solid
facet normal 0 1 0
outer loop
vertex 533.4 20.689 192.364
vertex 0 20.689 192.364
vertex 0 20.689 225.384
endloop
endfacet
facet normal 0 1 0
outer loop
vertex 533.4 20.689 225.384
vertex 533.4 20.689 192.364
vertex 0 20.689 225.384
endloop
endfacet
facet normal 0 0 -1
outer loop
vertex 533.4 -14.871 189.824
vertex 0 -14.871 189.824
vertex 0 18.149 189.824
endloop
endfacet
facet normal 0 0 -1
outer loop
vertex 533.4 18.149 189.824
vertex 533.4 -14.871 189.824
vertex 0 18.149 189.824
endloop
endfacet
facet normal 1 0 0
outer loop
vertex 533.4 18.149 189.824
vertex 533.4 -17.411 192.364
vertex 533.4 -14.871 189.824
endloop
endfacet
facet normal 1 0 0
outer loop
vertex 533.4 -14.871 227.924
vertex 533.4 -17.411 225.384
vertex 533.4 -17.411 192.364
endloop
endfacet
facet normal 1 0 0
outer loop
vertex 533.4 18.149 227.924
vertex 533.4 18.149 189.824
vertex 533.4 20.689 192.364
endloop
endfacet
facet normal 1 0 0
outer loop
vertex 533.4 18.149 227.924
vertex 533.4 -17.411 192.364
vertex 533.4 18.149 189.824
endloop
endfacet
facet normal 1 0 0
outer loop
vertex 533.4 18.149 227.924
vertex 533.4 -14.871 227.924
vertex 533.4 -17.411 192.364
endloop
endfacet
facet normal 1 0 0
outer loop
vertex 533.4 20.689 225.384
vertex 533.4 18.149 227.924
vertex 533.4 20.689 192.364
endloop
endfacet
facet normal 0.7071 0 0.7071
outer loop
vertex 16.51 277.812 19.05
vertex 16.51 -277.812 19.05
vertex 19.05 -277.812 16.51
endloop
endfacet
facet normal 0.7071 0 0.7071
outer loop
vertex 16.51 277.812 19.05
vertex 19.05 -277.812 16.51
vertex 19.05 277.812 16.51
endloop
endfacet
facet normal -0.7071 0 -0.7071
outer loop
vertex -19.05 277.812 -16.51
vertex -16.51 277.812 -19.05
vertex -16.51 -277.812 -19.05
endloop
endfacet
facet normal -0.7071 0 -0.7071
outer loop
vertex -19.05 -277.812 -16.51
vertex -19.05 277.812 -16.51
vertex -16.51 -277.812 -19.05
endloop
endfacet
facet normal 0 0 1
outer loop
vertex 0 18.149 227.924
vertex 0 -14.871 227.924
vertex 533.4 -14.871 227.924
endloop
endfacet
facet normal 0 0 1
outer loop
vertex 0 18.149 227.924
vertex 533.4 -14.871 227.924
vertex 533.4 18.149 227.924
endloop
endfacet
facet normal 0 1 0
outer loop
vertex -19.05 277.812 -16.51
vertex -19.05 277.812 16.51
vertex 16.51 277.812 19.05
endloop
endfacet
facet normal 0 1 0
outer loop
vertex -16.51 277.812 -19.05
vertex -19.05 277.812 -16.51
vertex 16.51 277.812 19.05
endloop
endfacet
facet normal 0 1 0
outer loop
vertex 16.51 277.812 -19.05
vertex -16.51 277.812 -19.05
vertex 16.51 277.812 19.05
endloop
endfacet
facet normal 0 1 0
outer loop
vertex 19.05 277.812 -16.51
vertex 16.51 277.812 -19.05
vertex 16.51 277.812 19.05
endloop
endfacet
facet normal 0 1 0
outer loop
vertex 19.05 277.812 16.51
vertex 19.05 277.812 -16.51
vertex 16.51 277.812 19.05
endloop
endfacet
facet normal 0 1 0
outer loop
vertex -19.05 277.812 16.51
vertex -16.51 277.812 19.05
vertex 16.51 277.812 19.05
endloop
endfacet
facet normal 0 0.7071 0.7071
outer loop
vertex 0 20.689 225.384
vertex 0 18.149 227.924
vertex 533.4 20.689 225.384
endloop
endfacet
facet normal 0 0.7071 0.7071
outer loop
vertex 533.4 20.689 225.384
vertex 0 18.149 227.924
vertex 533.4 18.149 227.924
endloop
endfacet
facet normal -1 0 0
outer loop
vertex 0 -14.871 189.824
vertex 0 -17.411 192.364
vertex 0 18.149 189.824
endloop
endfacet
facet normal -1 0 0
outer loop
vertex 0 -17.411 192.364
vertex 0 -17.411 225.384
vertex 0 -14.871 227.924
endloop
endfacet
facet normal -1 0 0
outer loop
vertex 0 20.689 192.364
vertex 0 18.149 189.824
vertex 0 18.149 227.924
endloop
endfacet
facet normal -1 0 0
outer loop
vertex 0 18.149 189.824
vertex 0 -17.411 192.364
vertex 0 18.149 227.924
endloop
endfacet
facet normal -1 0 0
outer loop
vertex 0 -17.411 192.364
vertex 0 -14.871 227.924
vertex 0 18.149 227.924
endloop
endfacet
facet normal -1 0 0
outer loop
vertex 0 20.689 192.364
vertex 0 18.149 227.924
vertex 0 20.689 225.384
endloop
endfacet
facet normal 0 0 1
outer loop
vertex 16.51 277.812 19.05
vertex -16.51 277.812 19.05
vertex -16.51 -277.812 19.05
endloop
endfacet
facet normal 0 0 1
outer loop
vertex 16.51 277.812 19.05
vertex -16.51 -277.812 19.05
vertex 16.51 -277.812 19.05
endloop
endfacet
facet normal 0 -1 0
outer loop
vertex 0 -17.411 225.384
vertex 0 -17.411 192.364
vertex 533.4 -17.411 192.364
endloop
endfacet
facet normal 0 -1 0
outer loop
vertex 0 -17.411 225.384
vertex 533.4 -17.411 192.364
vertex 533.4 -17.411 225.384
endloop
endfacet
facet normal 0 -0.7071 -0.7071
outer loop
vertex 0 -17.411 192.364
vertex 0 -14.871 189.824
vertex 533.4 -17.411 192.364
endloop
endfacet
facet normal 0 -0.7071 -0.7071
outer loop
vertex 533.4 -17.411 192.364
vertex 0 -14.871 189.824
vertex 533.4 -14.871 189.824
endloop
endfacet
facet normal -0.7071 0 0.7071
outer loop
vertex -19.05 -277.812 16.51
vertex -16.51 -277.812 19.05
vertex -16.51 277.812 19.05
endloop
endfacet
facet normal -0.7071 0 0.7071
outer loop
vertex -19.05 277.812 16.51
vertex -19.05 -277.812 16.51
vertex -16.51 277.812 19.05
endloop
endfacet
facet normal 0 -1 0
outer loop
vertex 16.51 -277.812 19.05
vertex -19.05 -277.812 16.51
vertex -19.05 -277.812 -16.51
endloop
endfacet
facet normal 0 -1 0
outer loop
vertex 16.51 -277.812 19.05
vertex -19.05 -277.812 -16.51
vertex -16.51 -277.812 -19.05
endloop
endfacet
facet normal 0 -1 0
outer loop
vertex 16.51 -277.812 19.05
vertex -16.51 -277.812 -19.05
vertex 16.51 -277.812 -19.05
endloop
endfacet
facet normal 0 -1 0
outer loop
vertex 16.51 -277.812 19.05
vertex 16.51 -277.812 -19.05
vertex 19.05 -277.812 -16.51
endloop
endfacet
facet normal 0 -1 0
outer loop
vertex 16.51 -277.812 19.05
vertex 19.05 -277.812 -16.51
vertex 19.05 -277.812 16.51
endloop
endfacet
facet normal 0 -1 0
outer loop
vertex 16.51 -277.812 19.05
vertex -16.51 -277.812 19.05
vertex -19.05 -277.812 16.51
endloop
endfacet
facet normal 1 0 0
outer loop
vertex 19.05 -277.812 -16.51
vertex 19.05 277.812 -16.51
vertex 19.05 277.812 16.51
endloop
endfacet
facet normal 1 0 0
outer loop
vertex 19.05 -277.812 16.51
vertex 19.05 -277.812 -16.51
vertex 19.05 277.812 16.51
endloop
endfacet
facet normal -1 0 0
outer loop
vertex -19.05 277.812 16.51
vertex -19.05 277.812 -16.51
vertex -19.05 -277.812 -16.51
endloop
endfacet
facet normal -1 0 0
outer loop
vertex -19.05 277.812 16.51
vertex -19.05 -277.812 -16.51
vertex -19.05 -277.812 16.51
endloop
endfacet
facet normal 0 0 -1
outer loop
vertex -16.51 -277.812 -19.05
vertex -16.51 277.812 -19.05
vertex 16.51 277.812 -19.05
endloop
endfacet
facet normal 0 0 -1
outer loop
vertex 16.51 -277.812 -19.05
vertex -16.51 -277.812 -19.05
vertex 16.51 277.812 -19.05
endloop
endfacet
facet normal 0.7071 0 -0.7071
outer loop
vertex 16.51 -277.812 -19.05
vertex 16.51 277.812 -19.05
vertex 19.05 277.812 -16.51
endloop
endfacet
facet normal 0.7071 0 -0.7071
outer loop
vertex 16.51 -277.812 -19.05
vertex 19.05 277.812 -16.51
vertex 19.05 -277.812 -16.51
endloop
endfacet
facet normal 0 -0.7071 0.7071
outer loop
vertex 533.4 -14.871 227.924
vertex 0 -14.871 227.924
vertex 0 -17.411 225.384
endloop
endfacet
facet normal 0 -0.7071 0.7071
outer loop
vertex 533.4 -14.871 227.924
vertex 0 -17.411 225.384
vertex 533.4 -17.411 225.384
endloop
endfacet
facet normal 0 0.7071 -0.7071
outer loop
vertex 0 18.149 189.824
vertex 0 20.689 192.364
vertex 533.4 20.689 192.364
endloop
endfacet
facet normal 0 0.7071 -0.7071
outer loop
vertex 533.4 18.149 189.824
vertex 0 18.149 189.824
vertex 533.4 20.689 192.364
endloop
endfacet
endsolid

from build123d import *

# Parameters (mm, degrees)
F0_W     = 38.1
F0_H     = 38.1
F1_DEPTH = 277.8125
F2_SIZE  = 2.54
F3_W     = 38.1
F3_H     = 38.1
F4_DEPTH = 533.4
F5_SIZE  = 2.54


with BuildPart() as f1:
    # F0 (on Front) → F1 (new body, symmetric)
    with BuildSketch(Plane.XZ):
        Rectangle(F0_W, F0_H)
    extrude(amount=F1_DEPTH, both=True)

    # F2
    f2_edges = [f1.edges().sort_by_distance(p)[0] for p in [
        (-19.05, 0, 19.05),
        (19.05, 0, 19.05),
        (19.05, 0, -19.05),
        (-19.05, 0, -19.05),
    ]]
    chamfer(f2_edges, length=F2_SIZE)


with BuildPart() as f4:
    # F3 (on Right) → F4 (new body)
    with BuildSketch(Plane.YZ):
        with Locations((1.639307, 208.873585)):
            Rectangle(F3_W, F3_H)
    extrude(amount=F4_DEPTH)

    # F5
    f5_edges = [f4.edges().sort_by_distance(p)[0] for p in [
        (266.7, -17.410693, 189.823585),
        (266.7, 20.689307, 189.823585),
        (266.7, 20.689307, 227.923585),
        (266.7, -17.410693, 227.923585),
    ]]
    chamfer(f5_edges, length=F5_SIZE)


with BuildPart() as f6_1:
    # F6: copy of F4
    add(f4.part.moved(Location((25.4, 0, 0))))


with BuildPart() as f8_1:
    # F8: copy of F4
    add(f4.part)


solid = Compound([f1.part, f4.part])
